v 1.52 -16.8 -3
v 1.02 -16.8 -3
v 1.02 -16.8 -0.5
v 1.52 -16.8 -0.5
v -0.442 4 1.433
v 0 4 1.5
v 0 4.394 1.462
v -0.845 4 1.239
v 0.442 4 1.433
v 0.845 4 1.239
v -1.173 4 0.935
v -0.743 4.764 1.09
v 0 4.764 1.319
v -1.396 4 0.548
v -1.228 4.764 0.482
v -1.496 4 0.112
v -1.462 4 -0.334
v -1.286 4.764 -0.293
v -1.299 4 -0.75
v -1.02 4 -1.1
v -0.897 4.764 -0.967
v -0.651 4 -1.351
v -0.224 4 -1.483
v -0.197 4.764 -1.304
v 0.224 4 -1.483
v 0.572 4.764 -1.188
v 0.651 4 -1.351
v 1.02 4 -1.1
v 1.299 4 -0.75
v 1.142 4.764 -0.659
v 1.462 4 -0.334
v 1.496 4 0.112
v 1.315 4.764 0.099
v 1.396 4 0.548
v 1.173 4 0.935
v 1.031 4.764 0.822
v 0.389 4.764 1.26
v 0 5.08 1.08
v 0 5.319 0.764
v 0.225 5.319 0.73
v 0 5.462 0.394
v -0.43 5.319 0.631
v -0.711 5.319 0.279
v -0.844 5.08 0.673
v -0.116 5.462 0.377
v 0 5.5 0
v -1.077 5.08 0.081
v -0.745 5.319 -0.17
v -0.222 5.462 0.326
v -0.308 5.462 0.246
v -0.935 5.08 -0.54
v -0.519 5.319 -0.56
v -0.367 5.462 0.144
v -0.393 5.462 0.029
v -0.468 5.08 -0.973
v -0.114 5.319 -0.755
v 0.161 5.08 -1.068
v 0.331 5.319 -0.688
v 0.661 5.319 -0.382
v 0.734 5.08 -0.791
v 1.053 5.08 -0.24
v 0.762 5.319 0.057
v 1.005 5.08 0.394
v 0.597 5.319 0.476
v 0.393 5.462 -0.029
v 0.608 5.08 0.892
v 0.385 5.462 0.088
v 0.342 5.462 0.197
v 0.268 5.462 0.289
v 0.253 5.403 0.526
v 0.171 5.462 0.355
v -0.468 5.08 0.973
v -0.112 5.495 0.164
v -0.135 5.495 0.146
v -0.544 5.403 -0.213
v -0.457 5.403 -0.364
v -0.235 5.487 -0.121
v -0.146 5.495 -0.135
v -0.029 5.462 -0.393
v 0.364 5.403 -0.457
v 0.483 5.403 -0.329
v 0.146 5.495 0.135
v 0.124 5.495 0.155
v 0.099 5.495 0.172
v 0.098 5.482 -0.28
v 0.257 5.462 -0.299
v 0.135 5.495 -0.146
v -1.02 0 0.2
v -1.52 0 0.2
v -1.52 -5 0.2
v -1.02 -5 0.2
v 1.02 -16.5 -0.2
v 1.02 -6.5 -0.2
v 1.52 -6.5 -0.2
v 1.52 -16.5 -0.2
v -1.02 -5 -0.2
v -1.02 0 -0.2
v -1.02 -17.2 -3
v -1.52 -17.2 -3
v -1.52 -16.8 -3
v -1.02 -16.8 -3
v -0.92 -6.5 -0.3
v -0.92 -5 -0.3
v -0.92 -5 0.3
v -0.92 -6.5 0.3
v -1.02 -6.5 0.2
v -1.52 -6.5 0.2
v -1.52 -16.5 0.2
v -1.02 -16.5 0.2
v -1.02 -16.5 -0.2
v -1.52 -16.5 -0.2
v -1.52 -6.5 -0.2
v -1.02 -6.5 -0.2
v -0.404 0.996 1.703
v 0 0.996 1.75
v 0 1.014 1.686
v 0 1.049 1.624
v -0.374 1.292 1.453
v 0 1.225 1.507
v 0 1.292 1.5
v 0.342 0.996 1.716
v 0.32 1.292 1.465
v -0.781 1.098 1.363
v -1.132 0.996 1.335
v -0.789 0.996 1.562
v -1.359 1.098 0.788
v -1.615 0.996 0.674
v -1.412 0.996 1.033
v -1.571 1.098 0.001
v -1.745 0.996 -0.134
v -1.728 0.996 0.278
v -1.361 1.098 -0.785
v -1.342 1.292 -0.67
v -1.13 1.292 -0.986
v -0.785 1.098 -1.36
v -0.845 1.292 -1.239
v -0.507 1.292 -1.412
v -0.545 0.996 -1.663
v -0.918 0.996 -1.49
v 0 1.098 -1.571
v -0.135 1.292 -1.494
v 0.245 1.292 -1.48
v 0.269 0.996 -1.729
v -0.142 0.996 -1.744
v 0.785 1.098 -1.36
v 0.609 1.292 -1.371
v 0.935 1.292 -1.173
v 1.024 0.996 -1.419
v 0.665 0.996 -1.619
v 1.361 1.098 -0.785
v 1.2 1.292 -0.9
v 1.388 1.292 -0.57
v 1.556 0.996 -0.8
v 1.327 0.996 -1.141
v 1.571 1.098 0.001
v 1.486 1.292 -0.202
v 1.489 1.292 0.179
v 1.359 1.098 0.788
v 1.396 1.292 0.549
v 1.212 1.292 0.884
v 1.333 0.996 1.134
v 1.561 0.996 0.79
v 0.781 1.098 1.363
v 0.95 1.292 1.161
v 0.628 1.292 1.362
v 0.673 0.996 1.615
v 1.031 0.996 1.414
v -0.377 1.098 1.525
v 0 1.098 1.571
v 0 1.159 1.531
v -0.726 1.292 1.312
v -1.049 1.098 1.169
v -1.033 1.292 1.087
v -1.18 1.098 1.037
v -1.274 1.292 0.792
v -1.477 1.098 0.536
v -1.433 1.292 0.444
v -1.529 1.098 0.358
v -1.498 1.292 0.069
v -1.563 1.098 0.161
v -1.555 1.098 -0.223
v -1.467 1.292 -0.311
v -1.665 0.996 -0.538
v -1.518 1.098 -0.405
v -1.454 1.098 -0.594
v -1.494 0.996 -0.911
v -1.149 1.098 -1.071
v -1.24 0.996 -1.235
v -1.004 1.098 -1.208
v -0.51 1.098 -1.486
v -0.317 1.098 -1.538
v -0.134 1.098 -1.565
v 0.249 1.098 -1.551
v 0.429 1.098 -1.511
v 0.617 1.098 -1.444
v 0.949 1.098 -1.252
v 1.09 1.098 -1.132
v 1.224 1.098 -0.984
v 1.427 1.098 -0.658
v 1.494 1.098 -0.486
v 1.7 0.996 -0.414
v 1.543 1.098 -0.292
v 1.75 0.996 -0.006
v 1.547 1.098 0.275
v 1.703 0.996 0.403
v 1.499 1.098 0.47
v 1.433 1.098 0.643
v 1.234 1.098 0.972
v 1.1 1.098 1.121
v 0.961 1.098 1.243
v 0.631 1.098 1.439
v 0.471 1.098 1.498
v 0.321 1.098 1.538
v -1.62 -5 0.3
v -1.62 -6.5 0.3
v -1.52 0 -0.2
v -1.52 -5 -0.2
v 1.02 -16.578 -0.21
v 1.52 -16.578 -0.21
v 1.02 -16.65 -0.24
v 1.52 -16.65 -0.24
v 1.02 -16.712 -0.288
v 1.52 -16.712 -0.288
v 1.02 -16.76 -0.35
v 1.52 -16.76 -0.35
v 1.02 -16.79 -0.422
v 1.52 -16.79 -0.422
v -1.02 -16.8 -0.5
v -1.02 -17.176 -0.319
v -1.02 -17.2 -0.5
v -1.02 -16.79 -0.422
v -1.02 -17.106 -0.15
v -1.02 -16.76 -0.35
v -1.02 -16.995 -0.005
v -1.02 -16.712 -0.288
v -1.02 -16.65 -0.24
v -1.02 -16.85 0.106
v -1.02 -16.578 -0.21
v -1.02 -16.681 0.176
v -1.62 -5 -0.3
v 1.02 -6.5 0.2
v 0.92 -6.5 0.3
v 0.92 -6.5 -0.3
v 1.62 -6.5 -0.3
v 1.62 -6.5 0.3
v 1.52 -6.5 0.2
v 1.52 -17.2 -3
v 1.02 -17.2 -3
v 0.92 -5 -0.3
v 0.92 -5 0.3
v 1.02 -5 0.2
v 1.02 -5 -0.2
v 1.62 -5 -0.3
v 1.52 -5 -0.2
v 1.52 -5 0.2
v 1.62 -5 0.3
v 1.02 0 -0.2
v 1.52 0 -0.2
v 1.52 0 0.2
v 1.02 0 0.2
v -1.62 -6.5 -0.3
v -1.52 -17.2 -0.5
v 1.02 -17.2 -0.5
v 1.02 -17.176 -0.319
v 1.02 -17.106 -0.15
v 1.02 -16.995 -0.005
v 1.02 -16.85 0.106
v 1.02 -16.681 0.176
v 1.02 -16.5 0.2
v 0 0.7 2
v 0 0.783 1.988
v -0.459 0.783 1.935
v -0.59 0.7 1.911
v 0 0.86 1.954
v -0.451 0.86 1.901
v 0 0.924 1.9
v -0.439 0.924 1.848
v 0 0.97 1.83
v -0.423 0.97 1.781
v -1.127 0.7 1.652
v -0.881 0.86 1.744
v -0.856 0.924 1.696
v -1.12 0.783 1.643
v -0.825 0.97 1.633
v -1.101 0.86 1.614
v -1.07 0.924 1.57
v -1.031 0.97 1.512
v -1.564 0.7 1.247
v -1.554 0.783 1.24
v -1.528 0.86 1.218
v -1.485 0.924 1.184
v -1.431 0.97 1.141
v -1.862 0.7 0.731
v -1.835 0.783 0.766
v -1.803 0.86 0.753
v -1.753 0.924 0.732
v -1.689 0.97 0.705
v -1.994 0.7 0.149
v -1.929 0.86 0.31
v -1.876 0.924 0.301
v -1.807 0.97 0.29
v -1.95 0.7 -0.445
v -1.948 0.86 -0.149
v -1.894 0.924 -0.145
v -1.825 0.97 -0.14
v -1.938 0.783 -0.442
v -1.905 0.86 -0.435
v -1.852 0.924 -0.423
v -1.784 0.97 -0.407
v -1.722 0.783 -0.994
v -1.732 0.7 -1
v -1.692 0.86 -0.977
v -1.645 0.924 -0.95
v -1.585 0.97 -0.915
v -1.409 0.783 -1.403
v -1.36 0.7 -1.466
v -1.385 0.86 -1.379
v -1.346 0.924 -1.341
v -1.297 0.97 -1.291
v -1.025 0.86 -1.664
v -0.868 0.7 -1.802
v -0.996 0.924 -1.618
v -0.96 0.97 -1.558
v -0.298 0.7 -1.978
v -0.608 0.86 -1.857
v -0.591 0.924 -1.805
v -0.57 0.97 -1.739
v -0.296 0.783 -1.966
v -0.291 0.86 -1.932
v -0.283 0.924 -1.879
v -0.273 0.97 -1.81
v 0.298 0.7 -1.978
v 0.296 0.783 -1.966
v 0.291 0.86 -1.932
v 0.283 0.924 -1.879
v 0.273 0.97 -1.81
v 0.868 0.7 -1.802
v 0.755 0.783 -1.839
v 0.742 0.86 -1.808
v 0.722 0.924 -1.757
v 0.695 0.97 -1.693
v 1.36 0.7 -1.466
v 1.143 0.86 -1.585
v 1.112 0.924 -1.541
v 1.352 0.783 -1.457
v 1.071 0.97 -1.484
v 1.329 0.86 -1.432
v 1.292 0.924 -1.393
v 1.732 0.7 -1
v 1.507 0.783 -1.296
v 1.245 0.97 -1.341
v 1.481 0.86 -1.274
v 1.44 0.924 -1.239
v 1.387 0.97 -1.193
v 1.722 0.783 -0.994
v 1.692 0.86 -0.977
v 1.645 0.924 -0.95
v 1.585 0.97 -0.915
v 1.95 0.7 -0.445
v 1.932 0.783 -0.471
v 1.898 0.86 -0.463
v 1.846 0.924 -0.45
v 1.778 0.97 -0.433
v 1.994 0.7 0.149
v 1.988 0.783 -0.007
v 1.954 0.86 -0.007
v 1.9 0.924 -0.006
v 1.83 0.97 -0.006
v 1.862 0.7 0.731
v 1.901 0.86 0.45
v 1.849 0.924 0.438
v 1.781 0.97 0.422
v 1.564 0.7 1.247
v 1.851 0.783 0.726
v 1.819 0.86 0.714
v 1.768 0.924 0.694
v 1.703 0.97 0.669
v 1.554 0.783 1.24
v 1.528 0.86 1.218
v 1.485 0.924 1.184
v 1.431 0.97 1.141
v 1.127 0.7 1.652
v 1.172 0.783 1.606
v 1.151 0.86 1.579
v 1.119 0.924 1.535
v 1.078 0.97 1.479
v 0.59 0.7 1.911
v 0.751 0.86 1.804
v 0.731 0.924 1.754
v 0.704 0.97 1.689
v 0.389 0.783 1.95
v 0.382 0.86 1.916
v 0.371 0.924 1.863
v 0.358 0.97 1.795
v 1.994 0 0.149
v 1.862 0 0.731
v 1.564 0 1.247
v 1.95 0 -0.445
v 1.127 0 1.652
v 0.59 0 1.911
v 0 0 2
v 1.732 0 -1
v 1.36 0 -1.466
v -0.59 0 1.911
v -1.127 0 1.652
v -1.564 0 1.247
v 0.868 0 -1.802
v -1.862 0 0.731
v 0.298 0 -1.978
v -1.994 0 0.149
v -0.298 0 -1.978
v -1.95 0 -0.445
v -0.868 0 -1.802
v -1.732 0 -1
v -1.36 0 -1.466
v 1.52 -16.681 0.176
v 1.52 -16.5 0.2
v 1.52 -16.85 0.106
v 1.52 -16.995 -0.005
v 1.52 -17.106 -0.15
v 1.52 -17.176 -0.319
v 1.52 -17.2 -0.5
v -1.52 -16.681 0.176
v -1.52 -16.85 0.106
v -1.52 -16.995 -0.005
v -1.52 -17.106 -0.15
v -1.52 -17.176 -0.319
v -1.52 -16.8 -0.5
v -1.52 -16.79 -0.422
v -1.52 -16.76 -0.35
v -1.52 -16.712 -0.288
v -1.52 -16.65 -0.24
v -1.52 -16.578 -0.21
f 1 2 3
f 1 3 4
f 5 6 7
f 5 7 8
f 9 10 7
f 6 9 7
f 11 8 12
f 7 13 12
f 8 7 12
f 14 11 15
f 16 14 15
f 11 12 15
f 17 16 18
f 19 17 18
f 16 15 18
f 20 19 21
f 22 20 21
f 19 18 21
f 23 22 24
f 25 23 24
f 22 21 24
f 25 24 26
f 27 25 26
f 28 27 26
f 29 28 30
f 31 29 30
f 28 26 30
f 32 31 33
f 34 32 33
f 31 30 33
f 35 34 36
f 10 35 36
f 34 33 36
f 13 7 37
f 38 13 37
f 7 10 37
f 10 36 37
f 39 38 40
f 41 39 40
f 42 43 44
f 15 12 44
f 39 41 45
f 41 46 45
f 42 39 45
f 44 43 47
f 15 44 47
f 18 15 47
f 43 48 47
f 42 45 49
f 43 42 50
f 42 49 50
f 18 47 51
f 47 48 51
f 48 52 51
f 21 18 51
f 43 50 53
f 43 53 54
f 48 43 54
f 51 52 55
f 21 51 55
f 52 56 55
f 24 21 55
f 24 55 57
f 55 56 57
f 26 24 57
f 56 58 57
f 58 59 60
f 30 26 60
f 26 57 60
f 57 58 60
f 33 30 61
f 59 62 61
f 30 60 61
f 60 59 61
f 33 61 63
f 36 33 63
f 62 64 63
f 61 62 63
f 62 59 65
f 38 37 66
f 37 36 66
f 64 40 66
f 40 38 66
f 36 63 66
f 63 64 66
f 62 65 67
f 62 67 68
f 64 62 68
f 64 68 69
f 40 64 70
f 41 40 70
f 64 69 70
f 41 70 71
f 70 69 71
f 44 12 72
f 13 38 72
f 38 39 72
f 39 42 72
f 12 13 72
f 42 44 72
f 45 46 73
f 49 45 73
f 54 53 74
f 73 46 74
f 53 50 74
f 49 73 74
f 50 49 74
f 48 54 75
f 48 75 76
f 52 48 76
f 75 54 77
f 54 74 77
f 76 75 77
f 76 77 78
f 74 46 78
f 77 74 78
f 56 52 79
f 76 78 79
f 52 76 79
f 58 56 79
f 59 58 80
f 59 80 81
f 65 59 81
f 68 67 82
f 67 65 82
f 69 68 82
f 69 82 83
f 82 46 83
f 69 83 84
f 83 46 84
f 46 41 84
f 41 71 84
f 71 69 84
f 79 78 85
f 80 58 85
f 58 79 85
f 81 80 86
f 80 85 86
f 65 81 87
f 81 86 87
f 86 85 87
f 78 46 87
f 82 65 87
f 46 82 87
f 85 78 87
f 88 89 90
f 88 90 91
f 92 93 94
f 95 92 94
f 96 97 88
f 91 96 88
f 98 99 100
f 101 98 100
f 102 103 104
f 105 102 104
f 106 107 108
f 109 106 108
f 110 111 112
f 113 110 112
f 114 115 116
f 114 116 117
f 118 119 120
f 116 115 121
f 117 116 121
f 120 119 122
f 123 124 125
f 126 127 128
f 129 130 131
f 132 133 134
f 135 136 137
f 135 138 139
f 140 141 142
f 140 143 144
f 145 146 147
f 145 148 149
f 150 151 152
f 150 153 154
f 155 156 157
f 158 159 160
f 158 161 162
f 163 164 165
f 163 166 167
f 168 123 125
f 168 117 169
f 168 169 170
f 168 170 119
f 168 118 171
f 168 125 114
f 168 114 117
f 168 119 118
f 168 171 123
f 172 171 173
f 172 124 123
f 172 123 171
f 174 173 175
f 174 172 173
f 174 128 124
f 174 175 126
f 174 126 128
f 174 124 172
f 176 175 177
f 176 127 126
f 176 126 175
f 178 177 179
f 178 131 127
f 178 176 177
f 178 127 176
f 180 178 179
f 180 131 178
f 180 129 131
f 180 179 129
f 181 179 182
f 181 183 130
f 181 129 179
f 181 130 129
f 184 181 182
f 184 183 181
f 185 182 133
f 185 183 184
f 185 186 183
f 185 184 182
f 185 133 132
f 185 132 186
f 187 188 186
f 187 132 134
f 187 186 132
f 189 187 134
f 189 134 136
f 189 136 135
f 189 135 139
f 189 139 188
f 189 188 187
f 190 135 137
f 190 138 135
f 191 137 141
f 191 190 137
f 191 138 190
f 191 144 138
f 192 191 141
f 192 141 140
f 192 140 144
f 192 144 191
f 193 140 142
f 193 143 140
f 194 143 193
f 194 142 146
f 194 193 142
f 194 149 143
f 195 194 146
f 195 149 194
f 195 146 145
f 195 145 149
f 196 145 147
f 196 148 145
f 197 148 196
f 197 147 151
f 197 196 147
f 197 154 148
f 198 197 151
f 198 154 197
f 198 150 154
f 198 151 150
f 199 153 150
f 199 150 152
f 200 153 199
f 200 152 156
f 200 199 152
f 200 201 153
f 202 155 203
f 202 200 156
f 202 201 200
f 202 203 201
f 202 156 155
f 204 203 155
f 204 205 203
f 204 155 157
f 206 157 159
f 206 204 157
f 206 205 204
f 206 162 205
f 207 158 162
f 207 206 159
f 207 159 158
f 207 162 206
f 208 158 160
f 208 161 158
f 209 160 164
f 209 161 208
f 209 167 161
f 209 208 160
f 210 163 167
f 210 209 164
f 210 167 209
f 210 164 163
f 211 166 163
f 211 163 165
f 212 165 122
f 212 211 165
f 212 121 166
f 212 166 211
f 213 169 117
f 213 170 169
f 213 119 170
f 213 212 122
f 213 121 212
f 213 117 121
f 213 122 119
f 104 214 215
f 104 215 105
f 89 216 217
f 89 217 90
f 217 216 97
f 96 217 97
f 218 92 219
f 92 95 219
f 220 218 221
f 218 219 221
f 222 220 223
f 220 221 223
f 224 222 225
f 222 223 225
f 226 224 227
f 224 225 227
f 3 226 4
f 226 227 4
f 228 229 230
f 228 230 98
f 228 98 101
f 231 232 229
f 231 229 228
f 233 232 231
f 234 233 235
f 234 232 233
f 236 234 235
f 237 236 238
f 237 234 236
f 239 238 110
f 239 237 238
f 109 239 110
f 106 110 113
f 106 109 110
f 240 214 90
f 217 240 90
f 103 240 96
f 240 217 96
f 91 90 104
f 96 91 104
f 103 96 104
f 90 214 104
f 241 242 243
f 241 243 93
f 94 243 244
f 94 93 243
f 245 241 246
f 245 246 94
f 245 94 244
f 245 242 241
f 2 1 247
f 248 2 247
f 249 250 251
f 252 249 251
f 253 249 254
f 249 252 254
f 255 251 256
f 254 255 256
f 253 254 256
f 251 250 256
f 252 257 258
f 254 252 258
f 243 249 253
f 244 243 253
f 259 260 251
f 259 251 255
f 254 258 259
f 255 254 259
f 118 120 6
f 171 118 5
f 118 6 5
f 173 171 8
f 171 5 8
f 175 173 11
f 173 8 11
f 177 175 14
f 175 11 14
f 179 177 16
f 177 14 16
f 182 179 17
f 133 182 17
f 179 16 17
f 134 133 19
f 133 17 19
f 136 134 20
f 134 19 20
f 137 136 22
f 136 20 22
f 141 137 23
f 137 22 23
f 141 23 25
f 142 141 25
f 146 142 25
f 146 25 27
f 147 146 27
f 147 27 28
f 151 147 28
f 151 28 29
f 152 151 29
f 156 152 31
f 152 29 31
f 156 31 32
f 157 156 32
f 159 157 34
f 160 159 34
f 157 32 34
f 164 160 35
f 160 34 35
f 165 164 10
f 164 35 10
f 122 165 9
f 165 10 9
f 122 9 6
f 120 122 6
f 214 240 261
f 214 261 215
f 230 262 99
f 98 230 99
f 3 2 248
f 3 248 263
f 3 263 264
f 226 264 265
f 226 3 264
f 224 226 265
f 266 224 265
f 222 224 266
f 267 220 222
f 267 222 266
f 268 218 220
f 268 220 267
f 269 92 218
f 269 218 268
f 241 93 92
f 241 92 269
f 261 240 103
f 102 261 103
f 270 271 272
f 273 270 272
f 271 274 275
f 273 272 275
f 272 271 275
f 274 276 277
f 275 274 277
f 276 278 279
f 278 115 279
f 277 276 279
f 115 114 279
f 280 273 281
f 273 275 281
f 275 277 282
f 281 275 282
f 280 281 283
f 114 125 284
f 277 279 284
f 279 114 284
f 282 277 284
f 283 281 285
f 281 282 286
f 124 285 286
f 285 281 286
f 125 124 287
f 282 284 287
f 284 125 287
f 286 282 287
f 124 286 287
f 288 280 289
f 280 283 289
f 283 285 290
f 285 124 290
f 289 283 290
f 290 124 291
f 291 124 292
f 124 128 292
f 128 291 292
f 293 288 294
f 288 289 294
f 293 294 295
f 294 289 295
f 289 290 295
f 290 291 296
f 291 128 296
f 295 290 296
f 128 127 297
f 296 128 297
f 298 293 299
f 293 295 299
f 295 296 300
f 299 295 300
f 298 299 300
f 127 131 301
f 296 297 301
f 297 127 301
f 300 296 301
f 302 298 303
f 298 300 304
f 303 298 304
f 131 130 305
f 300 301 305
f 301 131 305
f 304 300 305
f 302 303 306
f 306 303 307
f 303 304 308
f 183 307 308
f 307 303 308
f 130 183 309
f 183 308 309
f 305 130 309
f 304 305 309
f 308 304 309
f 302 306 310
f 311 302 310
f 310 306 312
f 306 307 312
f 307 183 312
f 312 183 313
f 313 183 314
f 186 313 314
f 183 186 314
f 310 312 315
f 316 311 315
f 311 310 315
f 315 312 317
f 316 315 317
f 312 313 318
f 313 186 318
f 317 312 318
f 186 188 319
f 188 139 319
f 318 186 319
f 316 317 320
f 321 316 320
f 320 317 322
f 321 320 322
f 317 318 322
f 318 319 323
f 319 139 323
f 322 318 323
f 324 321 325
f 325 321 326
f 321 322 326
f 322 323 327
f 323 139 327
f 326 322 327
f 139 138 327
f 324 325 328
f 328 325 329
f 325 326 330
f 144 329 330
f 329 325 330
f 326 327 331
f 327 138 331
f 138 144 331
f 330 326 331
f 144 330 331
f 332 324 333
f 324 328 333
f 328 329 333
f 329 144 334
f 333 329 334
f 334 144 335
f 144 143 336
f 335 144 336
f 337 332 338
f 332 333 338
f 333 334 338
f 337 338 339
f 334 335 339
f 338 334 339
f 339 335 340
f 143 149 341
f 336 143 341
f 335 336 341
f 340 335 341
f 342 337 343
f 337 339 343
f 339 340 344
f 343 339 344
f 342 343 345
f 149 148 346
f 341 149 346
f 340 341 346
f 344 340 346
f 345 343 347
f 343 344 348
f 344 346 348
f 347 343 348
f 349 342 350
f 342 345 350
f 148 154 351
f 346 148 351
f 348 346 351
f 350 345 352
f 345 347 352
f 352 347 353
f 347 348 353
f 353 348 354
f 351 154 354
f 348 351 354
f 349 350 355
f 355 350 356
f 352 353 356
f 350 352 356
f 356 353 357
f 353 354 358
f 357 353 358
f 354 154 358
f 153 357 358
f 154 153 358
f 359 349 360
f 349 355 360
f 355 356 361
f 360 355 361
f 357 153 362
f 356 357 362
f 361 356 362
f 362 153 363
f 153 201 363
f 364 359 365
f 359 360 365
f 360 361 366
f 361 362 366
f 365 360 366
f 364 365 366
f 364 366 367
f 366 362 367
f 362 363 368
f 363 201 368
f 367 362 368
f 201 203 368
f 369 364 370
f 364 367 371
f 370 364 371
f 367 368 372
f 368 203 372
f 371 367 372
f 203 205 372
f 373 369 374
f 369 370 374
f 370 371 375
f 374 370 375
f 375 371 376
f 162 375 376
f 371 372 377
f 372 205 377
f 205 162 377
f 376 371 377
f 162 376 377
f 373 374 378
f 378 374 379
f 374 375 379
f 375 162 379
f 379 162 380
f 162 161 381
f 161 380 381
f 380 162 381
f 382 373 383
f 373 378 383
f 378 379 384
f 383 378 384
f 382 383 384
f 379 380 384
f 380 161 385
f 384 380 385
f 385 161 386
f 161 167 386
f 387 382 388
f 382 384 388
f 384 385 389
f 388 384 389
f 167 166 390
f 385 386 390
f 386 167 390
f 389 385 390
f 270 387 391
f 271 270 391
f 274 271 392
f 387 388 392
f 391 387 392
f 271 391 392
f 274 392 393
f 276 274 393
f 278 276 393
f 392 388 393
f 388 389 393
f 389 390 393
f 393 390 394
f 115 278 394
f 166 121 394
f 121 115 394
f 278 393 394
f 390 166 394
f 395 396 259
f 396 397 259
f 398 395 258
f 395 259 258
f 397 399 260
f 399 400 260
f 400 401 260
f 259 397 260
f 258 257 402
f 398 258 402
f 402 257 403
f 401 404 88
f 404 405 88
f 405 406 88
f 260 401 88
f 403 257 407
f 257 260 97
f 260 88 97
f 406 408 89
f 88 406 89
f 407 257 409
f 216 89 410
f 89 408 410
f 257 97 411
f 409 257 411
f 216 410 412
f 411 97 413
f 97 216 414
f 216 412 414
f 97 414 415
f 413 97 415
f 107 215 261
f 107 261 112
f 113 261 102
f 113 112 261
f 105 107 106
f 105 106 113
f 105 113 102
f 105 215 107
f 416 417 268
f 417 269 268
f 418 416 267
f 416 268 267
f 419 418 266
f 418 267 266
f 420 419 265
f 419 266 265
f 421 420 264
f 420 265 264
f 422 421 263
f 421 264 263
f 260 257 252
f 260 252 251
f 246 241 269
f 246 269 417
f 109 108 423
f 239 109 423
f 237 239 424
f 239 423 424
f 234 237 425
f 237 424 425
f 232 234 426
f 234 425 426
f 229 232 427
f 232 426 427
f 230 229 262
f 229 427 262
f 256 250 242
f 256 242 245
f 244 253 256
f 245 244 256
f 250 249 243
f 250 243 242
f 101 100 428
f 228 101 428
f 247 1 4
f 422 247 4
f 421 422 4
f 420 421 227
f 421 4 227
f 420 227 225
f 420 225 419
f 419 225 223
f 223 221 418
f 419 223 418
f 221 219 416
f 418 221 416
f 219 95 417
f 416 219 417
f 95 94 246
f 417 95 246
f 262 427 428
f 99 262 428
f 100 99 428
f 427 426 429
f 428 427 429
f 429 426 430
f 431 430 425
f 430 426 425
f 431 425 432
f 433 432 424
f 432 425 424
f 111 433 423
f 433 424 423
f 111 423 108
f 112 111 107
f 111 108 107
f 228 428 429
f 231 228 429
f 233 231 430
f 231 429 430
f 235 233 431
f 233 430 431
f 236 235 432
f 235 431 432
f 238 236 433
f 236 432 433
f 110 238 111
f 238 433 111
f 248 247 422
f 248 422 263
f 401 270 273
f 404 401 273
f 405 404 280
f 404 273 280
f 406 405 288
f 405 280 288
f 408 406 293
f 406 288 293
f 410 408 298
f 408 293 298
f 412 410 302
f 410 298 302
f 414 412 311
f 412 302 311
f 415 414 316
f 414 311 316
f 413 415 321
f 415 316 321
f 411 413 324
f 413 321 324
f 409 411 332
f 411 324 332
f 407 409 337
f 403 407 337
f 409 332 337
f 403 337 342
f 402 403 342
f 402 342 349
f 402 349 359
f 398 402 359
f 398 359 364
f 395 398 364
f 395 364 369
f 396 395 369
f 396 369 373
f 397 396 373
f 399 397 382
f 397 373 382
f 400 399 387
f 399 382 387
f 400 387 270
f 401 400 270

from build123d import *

# Parameters (mm, degrees)
FILLET_1_R      = 0.3
FILLET_2_R      = 0.3
SKETCH_2_W      = 0.5
SKETCH_2_H      = 0.4
EXTRUDE_1_DEPTH = 5
SKETCH_3_W      = 0.7
SKETCH_3_H      = 0.6
EXTRUDE_2_DEPTH = 1.5
SKETCH_5_W      = 0.5
SKETCH_5_H      = 0.4
EXTRUDE_3_DEPTH = 9.5
SWEEP_START     = -1.52
SWEEP_2_DEPTH   = 0.5
SKETCH_7_262_W  = 0.5
SKETCH_7_262_H  = 0.4


# Read off the part's stored shape, not the designer's step: По траектории2
with BuildPart() as part:
    # Эскиз1 → Повернуть2 (revolve)
    with BuildSketch(Plane(origin=(0, 0, 0), x_dir=(0, 0, -1), z_dir=(1, 0, 0))):
        with BuildLine():
            Line((0, 0), (-2, 0))
            Line((-2, 0), (-2, 1))
            Line((-2, 1), (-1.5, 1))
            Line((-1.5, 1), (-1.5, 4))
            ThreePointArc((-1.5, 4), (-1.07971355, 5.07971355), (0, 5.5))
            Line((0, 5.5), (0, 0))
        make_face()
    revolve(axis=Axis((0, 5.5, 0), (0, -1, 0)))

    # Скругление1
    fillet_1_edges = [part.edges().sort_by_distance(p)[0] for p in [
        (0, 1, -2),
    ]]
    fillet(fillet_1_edges, radius=FILLET_1_R)

    # Скругление2
    fillet_2_edges = [part.edges().sort_by_distance(p)[0] for p in [
        (0, 1, -1.5),
    ]]
    fillet(fillet_2_edges, radius=FILLET_2_R)

    # Эскиз2 → Вытянуть1 (add)
    with BuildSketch(Plane.XZ):
        with Locations((-1.27, 0)):
            Rectangle(SKETCH_2_W, SKETCH_2_H)
        with Locations((1.27, 0)):
            Rectangle(SKETCH_2_W, SKETCH_2_H)
    extrude(amount=EXTRUDE_1_DEPTH)

    # Эскиз3 → Вытянуть2 (add)
    with BuildSketch(Plane.XZ.offset(5)):
        with Locations((-1.27, 0)):
            Rectangle(SKETCH_3_W, SKETCH_3_H)
        with Locations((1.27, 0)):
            Rectangle(SKETCH_3_W, SKETCH_3_H)
    extrude(amount=EXTRUDE_2_DEPTH)

    # Эскиз5 → Вытянуть3 (add)
    with BuildSketch(Plane.XZ.offset(6.5)):
        with Locations((-1.27, 0)):
            Rectangle(SKETCH_5_W, SKETCH_5_H)
        with Locations((1.27, 0)):
            Rectangle(SKETCH_5_W, SKETCH_5_H)
    extrude(amount=EXTRUDE_3_DEPTH)

    # По траектории2 outline → По траектории2 (add)
    with BuildSketch(Plane.YZ.offset(SWEEP_START)):
        with BuildLine():
            Line((-17.2, -3), (-16.8, -3))
            Line((-16.8, -3), (-16.8, -0.5))
            ThreePointArc((-16.8, -0.5), (-16.712132034, -0.287867966), (-16.5, -0.2))
            Line((-16.5, -0.2), (-16, -0.2))
            Line((-16, -0.2), (-16, 0.2))
            Line((-16, 0.2), (-16.5, 0.2))
            ThreePointArc((-16.5, 0.2), (-16.994974747, -0.005025253), (-17.2, -0.5))
            Line((-17.2, -0.5), (-17.2, -3))
        make_face()
    extrude(amount=SWEEP_2_DEPTH)

    # По траектории11: sweep along a curve in space
    with BuildLine() as sweep_11_path:
        Line((-1.27, -16, 0), (-1.27, -16.5, 0))
        ThreePointArc((-1.27, -16.5, 0), (-1.27, -16.853553391, -0.146446609), (-1.27, -17, -0.5))
        Line((-1.27, -17, -0.5), (-1.27, -17, -3))
    # Эскиз7<262> → По траектории11 (sweep)
    with BuildSketch(Plane.XZ.offset(16)):
        with Locations((-1.27, 0)):
            Rectangle(SKETCH_7_262_W, SKETCH_7_262_H)
        with Locations((1.27, 0)):
            Rectangle(SKETCH_7_262_W, SKETCH_7_262_H)
    sweep(path=sweep_11_path.line)


solid = part.part
